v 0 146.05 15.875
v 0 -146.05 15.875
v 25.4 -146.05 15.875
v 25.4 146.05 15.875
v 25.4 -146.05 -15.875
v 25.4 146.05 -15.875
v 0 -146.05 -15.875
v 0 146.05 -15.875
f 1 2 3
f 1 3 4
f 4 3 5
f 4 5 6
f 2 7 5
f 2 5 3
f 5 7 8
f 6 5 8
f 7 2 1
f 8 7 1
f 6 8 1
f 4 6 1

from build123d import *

# Parameters (mm, degrees)
F0_W     = 292.1
F0_H     = 31.75
F1_DEPTH = 20.32
F2_DEPTH = 5.08
F3_DEPTH = 25.4
F4_DEPTH = 25.4


with BuildPart() as f1:
    # F0 (on Right) → F1 (new body)
    with BuildSketch(Plane.YZ):
        Rectangle(F0_W, F0_H)
    extrude(amount=F1_DEPTH)

    # F2 (add): a face of the model
    f2_faces = [f1.faces().sort_by_distance(p)[0] for p in [
        (20.32, 0, 0),
    ]]
    extrude(f2_faces, amount=F2_DEPTH)

    # F3 (add): a face of the model
    f3_faces = [f1.faces().sort_by_distance(p)[0] for p in [
        (25.4, 0, 0),
    ]]
    extrude(f3_faces, amount=F3_DEPTH)

    # F4 (cut): a face of the model
    f4_faces = [f1.faces().sort_by_distance(p)[0] for p in [
        (50.8, 0, 0),
    ]]
    extrude(f4_faces, amount=-F4_DEPTH, mode=Mode.SUBTRACT)


solid = f1.part
